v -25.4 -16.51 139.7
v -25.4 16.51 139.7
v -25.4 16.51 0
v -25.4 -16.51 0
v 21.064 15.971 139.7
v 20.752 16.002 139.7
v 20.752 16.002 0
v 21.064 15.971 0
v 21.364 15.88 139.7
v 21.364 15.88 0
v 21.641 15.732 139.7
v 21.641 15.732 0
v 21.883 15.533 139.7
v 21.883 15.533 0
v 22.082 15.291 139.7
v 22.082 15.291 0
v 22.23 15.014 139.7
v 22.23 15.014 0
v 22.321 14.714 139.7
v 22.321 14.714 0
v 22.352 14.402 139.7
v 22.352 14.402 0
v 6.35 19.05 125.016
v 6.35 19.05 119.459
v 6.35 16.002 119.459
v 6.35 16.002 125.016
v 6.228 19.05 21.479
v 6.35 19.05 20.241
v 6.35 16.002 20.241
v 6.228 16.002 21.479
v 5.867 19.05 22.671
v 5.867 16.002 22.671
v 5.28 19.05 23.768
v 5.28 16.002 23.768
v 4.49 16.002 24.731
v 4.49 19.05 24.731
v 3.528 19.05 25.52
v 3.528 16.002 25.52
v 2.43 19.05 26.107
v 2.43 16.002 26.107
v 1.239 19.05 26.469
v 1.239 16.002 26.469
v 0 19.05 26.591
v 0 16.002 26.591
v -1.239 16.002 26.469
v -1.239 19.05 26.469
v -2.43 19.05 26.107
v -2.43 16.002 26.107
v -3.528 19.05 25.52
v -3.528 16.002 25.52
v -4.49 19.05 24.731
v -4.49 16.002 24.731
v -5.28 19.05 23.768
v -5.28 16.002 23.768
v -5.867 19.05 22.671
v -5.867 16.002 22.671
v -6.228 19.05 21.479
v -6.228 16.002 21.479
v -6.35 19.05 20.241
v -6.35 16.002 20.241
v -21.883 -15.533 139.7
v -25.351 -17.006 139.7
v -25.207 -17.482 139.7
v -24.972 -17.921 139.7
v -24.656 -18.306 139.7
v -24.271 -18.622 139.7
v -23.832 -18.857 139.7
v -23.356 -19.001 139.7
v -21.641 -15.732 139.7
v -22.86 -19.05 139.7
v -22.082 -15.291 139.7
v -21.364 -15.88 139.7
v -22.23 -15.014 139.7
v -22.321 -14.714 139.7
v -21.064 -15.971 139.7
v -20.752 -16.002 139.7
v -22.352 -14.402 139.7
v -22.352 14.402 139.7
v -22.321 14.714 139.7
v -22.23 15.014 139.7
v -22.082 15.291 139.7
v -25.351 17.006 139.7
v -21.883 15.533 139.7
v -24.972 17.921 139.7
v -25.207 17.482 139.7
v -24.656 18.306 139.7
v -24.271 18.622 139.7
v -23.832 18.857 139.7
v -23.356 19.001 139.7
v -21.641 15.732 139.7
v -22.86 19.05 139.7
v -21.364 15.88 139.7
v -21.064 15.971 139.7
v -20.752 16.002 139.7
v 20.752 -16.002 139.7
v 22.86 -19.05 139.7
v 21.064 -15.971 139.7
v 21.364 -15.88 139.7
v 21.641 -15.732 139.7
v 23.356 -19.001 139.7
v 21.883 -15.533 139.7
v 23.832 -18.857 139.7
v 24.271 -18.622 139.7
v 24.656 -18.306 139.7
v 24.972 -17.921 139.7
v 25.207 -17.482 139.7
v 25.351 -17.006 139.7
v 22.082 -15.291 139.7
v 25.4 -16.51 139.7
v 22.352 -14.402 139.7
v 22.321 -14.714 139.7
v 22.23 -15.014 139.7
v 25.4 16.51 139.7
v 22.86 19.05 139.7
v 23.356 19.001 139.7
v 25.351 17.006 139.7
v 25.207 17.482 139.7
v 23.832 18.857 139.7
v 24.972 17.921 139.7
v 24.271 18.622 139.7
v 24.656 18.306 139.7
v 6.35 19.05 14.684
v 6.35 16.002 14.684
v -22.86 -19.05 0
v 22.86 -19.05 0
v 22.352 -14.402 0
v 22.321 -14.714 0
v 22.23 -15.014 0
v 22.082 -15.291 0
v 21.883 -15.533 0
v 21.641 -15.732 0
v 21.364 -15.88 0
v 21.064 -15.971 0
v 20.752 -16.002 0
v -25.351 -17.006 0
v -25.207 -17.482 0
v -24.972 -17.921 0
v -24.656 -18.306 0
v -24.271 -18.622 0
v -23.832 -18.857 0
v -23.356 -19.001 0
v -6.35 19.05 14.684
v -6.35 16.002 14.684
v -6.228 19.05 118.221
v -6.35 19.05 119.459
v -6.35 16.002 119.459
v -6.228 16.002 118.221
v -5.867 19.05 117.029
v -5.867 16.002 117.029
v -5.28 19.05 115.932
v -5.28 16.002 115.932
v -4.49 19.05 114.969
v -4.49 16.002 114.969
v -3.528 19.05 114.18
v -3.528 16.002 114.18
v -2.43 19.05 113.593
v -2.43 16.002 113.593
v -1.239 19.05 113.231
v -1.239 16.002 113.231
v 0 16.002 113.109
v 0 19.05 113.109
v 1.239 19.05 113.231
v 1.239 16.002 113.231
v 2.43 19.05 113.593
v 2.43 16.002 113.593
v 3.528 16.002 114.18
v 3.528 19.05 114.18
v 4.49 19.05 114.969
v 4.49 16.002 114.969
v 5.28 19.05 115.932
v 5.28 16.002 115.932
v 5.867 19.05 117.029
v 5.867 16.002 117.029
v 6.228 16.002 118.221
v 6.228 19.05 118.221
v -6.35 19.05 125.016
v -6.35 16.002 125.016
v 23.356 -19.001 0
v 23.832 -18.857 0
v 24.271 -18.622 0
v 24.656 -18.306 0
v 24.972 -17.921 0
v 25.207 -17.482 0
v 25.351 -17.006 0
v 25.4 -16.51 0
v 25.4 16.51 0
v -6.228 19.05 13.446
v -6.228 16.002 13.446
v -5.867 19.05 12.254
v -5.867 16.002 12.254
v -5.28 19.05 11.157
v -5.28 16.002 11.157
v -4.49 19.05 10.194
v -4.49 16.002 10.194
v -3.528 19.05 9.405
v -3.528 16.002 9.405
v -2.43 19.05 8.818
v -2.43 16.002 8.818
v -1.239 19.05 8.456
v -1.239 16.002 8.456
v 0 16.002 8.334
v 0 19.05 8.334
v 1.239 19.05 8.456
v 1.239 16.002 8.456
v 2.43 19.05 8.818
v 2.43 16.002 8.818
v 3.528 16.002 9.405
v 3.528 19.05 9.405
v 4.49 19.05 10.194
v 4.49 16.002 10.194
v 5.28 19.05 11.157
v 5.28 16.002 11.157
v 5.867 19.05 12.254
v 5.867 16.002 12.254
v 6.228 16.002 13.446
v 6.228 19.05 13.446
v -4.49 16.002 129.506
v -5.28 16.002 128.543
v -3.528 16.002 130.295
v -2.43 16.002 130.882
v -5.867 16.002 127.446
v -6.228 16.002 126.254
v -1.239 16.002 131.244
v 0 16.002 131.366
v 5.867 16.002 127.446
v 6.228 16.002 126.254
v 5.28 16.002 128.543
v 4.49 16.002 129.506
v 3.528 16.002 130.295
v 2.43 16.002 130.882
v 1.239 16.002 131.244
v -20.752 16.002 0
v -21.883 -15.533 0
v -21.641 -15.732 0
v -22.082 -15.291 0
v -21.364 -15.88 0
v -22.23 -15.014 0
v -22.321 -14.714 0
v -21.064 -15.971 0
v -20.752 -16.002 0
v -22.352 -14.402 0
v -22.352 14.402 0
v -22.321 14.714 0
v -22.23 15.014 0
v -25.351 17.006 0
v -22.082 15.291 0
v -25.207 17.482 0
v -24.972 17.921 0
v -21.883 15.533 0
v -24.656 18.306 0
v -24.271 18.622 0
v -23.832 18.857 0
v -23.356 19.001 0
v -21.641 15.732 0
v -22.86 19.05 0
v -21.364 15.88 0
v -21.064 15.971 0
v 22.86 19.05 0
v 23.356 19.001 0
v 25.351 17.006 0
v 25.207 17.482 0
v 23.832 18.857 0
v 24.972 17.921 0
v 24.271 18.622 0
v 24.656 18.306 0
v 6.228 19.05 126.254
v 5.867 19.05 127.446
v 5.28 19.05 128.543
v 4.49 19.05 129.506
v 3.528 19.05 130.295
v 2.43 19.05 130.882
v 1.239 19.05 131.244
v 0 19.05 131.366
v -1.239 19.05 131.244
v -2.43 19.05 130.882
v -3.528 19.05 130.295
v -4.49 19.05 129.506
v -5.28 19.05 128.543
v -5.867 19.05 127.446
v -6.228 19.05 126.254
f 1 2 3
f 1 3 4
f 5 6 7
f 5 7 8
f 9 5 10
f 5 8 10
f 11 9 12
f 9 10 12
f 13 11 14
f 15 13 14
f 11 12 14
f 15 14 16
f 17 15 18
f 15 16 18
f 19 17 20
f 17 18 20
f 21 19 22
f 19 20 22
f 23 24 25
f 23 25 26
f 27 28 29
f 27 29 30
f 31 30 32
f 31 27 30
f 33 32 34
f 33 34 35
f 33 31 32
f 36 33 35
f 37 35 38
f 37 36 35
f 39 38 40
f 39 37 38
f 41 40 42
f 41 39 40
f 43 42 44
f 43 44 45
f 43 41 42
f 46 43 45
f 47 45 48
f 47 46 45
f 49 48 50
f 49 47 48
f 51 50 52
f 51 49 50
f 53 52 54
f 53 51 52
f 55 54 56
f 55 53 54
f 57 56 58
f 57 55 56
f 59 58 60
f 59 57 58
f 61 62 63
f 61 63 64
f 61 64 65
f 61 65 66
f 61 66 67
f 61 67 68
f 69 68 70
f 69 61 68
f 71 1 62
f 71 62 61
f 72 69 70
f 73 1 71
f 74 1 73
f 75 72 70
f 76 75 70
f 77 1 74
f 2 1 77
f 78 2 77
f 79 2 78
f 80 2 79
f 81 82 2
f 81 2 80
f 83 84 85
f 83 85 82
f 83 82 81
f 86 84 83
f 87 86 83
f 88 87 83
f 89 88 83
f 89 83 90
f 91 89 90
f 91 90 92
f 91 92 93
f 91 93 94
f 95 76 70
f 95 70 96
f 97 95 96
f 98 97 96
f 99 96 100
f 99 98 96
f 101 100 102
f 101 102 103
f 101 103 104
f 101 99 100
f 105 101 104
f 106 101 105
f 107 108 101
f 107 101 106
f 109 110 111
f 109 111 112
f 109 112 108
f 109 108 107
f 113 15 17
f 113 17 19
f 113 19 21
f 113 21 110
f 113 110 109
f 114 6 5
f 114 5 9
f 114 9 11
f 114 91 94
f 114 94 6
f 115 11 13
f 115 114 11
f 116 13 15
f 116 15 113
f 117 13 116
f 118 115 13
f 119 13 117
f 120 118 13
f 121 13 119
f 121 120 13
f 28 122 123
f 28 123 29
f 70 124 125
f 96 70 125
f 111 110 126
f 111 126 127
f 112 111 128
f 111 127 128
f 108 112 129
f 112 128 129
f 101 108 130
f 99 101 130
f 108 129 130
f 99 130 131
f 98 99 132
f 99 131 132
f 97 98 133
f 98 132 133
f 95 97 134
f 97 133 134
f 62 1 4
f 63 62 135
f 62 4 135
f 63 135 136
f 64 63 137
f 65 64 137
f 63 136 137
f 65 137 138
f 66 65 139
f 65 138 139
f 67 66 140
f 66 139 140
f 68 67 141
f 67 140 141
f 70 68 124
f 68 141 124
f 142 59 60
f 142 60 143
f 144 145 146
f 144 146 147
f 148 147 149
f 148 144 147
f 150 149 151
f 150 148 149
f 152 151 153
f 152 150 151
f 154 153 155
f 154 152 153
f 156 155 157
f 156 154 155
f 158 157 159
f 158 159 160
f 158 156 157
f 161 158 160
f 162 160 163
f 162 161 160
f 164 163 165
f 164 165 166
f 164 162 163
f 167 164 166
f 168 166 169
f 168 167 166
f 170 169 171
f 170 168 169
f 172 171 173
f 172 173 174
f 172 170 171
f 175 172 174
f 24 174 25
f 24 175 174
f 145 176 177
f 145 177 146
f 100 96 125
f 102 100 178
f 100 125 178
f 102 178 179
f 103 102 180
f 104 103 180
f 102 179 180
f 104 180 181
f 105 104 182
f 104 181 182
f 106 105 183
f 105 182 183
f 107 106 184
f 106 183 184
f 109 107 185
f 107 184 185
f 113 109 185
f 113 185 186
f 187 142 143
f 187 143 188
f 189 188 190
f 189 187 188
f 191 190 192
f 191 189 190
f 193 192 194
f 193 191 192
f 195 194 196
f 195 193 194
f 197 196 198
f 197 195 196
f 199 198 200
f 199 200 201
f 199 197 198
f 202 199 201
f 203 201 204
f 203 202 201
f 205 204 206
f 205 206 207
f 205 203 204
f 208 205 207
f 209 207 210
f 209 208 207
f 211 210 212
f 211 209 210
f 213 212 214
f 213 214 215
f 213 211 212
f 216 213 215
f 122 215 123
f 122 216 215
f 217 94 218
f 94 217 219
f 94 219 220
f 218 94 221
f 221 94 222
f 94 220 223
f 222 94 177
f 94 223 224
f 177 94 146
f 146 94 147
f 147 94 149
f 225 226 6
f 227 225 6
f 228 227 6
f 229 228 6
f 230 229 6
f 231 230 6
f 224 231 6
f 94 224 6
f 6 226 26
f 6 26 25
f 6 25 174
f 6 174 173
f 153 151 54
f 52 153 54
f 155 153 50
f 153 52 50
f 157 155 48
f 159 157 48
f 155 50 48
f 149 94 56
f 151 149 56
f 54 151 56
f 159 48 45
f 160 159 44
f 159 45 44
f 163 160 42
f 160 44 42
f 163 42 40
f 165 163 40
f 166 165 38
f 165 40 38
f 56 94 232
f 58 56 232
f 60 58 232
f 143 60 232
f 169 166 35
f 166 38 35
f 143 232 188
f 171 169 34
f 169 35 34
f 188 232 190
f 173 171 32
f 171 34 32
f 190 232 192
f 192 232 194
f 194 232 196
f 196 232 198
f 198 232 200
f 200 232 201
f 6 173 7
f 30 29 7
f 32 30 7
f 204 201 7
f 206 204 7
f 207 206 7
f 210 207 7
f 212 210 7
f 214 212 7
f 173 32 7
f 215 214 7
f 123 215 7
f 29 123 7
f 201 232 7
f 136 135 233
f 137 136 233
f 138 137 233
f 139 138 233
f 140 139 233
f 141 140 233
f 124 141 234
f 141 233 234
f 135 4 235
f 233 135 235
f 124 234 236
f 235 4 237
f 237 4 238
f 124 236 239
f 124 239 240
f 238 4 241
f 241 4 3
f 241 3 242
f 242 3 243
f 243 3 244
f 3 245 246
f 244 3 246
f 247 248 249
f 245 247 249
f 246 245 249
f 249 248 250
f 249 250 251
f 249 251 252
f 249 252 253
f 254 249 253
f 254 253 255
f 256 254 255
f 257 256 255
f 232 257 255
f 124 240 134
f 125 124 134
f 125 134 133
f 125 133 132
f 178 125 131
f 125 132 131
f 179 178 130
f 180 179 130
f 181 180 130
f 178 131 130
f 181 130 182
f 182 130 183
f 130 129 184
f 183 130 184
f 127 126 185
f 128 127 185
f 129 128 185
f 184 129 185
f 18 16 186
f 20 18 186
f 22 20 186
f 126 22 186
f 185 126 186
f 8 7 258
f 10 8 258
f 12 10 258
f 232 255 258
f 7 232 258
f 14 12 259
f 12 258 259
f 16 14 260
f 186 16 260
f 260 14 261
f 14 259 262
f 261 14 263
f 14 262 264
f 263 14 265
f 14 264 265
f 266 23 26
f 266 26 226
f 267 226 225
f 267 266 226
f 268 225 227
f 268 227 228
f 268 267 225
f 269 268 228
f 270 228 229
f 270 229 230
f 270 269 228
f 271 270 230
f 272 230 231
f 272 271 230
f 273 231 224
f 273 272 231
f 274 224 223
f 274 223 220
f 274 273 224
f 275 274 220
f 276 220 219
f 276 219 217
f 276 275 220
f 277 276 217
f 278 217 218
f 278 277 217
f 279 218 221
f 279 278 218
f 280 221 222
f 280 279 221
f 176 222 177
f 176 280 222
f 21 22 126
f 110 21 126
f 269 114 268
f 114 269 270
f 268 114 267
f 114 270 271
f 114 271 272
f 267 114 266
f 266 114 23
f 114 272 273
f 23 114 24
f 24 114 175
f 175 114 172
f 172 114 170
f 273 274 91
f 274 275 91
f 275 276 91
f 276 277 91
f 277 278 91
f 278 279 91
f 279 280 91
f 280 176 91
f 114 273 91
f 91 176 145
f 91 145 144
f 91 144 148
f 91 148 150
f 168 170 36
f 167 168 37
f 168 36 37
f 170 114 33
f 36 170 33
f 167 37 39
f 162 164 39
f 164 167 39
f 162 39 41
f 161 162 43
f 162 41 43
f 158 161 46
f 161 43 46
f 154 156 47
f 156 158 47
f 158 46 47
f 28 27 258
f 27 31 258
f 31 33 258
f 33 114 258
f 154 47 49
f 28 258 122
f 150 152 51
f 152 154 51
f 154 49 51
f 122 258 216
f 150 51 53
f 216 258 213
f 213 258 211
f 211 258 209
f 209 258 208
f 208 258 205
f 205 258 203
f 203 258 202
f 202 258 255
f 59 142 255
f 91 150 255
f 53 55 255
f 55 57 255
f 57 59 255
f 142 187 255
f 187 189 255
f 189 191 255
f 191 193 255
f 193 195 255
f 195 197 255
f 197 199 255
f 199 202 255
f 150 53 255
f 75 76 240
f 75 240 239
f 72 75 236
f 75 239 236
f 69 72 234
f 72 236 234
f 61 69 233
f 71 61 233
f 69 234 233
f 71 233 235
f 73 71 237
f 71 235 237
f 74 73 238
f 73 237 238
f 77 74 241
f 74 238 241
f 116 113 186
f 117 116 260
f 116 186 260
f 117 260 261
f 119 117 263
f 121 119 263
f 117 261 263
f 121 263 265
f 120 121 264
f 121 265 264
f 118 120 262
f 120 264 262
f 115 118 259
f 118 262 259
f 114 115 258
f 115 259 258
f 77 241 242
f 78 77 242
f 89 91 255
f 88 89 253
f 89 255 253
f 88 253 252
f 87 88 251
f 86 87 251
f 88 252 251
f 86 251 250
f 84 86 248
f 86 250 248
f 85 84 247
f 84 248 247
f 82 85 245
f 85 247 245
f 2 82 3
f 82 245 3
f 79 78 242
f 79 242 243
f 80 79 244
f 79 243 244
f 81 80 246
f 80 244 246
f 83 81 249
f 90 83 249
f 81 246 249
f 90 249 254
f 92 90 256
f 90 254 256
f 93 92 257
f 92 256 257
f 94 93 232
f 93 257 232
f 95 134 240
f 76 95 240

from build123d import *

# Parameters (mm, degrees)
BOSS_EXTRUDE1_DEPTH = 139.7
CUT_EXTRUDE1_DEPTH  = 3.048


with BuildPart() as part:
    # Sketch4 → Boss-Extrude1 (new body)
    with BuildSketch(Plane.XY):
        with BuildLine():
            Line((25.4, -16.51), (25.4, 16.51))
            ThreePointArc((25.4, 16.51), (24.656051224, 18.306051224), (22.86, 19.05))
            Line((22.86, 19.05), (-22.86, 19.05))
            ThreePointArc((-22.86, 19.05), (-24.656051224, 18.306051224), (-25.4, 16.51))
            Line((-25.4, 16.51), (-25.4, -16.51))
            ThreePointArc((-25.4, -16.51), (-24.656051224, -18.306051224), (-22.86, -19.05))
            Line((-22.86, -19.05), (22.86, -19.05))
            ThreePointArc((22.86, -19.05), (24.656051224, -18.306051224), (25.4, -16.51))
        make_face()
        with BuildLine():
            Line((22.352, 14.4018), (22.352, -14.4018))
            ThreePointArc((22.352, -14.4018), (21.883312271, -15.533312271), (20.7518, -16.002))
            Line((20.7518, -16.002), (-20.7518, -16.002))
            ThreePointArc((-20.7518, -16.002), (-21.883312271, -15.533312271), (-22.352, -14.4018))
            Line((-22.352, -14.4018), (-22.352, 14.4018))
            ThreePointArc((-22.352, 14.4018), (-21.883312271, 15.533312271), (-20.7518, 16.002))
            Line((-20.7518, 16.002), (20.7518, 16.002))
            ThreePointArc((20.7518, 16.002), (21.883312271, 15.533312271), (22.352, 14.4018))
        make_face(mode=Mode.SUBTRACT)
    extrude(amount=BOSS_EXTRUDE1_DEPTH)

    # Sketch7 → Cut-Extrude1 (cut)
    with BuildSketch(Plane(origin=(0, 19.05, 0), x_dir=(1, 0, 0), z_dir=(0, 1, 0))):
        with BuildLine():
            Line((-6.35, -20.240625), (-6.35, -14.684375))
            ThreePointArc((-6.35, -14.684375), (0, -8.334375), (6.35, -14.684375))
            Line((6.35, -14.684375), (6.35, -20.240625))
            ThreePointArc((6.35, -20.240625), (0, -26.590625), (-6.35, -20.240625))
        make_face()
        with BuildLine():
            Line((-6.35, -125.015625), (-6.35, -119.459375))
            ThreePointArc((-6.35, -119.459375), (0, -113.109375), (6.35, -119.459375))
            Line((6.35, -119.459375), (6.35, -125.015625))
            ThreePointArc((6.35, -125.015625), (0, -131.365625), (-6.35, -125.015625))
        make_face()
    extrude(amount=-CUT_EXTRUDE1_DEPTH, mode=Mode.SUBTRACT)


solid = part.part
